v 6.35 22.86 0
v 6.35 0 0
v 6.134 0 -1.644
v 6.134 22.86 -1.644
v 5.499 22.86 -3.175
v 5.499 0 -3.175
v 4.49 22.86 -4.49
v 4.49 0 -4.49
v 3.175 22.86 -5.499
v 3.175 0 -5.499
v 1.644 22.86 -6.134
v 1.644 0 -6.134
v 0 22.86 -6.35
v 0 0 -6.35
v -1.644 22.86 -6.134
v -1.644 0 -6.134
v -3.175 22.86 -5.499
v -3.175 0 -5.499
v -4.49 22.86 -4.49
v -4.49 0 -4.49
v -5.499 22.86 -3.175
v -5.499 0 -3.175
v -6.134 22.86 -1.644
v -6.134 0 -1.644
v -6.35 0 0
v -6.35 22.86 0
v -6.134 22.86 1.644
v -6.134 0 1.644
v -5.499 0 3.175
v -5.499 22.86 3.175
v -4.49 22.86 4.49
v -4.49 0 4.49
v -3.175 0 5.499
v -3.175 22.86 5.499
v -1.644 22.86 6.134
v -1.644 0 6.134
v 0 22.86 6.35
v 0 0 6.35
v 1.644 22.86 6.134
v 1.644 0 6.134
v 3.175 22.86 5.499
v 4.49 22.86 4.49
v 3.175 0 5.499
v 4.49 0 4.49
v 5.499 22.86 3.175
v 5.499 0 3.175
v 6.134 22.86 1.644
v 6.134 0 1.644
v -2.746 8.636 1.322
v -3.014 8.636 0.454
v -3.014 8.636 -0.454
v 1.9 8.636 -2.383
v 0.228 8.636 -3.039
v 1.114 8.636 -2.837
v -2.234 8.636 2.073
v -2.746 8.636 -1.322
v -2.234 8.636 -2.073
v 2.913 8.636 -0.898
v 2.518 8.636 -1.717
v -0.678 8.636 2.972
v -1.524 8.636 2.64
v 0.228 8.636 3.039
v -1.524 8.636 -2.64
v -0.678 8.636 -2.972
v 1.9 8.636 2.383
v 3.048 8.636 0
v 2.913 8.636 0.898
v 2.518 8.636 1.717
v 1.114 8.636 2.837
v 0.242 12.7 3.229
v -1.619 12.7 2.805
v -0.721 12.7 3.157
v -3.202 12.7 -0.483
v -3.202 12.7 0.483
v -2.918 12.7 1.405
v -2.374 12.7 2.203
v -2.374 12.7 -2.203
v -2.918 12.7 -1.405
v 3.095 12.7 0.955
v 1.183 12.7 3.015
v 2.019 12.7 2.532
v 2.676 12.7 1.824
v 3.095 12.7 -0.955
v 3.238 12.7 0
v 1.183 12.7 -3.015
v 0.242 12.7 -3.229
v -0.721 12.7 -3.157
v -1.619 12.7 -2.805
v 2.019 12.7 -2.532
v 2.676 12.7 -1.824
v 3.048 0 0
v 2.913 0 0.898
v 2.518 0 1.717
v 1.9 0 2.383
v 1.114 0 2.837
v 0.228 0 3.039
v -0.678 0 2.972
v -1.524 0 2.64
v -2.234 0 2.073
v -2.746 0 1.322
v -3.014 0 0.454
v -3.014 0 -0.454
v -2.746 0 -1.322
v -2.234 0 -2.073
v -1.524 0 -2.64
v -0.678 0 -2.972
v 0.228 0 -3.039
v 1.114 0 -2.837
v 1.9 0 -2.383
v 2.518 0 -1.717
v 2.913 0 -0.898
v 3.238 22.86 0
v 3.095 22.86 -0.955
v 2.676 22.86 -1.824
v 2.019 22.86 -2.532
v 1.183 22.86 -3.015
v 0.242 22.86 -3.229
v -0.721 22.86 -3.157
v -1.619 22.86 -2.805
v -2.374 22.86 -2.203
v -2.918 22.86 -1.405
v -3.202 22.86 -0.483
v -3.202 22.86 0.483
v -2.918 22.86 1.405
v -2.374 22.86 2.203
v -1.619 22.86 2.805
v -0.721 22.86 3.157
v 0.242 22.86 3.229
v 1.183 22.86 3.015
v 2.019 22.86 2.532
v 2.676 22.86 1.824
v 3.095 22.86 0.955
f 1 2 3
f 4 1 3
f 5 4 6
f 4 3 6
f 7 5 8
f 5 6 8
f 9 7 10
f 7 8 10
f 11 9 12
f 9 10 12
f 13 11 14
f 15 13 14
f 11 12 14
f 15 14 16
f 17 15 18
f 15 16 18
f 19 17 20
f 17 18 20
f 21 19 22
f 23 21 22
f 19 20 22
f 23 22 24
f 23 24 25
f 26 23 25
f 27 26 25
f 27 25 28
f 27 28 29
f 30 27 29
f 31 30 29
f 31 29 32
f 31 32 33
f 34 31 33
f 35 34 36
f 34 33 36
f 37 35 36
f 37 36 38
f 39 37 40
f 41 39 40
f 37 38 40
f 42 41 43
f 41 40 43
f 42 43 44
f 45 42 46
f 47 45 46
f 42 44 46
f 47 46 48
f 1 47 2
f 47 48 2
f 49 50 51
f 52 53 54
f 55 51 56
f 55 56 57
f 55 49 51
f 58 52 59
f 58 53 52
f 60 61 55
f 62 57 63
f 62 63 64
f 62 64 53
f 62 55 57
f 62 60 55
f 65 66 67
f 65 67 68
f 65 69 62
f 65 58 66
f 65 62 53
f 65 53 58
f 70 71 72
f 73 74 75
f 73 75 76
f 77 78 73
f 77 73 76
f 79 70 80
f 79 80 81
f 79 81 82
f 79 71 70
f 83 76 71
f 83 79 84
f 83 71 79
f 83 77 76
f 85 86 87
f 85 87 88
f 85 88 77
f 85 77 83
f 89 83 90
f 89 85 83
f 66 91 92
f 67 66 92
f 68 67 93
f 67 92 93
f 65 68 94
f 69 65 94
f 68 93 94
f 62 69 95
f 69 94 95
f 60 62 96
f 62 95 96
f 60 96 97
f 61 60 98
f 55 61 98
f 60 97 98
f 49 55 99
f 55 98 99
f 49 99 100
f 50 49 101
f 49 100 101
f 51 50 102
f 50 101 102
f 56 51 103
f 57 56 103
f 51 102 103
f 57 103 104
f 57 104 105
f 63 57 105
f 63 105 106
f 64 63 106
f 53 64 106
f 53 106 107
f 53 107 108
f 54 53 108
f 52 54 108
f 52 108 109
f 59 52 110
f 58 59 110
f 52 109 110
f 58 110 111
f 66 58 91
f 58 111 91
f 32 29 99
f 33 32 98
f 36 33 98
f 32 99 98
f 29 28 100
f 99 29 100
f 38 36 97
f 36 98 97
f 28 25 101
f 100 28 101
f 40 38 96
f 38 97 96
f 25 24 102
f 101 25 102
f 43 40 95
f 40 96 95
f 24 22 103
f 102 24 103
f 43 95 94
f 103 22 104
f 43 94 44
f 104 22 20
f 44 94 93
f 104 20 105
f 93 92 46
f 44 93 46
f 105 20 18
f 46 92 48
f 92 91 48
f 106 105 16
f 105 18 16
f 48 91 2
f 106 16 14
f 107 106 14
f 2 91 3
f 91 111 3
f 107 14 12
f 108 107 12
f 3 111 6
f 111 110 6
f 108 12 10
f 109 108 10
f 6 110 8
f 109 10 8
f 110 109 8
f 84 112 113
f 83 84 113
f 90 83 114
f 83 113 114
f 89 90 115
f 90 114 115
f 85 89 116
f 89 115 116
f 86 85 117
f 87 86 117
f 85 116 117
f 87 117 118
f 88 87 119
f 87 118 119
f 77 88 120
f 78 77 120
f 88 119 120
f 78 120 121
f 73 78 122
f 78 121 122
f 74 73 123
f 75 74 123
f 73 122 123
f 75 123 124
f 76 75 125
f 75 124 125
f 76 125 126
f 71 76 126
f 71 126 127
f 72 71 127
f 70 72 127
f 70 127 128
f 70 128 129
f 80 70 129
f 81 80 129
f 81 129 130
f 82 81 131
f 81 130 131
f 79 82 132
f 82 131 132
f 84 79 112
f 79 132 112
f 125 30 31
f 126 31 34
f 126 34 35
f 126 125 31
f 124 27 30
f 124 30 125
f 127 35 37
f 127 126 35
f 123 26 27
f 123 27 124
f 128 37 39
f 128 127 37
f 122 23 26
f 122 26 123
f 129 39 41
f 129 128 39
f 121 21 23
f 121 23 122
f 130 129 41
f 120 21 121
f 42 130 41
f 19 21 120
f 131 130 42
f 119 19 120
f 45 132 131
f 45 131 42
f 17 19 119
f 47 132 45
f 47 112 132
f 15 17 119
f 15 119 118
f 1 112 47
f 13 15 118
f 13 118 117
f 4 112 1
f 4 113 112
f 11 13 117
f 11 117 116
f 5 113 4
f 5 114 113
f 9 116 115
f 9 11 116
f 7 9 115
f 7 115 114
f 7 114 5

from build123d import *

# Parameters (mm, degrees)
SKETCH1_R           = 6.35
BOSS_EXTRUDE1_DEPTH = 22.86
SKETCH2_R           = 3.048
CUT_EXTRUDE1_DEPTH  = 8.636
SKETCH3_R           = 3.2385
CUT_EXTRUDE2_DEPTH  = 10.16


with BuildPart() as part:
    # Sketch1 → Boss-Extrude1 (new body)
    with BuildSketch(Plane(origin=(0, 0, 0), x_dir=(1, 0, 0), z_dir=(0, 1, 0))):
        Circle(SKETCH1_R)
    extrude(amount=BOSS_EXTRUDE1_DEPTH)

    # Sketch2 → Cut-Extrude1 (cut)
    with BuildSketch(Plane.XZ):
        Circle(SKETCH2_R)
    extrude(amount=-CUT_EXTRUDE1_DEPTH, mode=Mode.SUBTRACT)

    # Sketch3 → Cut-Extrude2 (cut)
    with BuildSketch(Plane(origin=(0, 22.86, 0), x_dir=(1, 0, 0), z_dir=(0, 1, 0))):
        Circle(SKETCH3_R)
    extrude(amount=-CUT_EXTRUDE2_DEPTH, mode=Mode.SUBTRACT)


solid = part.part
